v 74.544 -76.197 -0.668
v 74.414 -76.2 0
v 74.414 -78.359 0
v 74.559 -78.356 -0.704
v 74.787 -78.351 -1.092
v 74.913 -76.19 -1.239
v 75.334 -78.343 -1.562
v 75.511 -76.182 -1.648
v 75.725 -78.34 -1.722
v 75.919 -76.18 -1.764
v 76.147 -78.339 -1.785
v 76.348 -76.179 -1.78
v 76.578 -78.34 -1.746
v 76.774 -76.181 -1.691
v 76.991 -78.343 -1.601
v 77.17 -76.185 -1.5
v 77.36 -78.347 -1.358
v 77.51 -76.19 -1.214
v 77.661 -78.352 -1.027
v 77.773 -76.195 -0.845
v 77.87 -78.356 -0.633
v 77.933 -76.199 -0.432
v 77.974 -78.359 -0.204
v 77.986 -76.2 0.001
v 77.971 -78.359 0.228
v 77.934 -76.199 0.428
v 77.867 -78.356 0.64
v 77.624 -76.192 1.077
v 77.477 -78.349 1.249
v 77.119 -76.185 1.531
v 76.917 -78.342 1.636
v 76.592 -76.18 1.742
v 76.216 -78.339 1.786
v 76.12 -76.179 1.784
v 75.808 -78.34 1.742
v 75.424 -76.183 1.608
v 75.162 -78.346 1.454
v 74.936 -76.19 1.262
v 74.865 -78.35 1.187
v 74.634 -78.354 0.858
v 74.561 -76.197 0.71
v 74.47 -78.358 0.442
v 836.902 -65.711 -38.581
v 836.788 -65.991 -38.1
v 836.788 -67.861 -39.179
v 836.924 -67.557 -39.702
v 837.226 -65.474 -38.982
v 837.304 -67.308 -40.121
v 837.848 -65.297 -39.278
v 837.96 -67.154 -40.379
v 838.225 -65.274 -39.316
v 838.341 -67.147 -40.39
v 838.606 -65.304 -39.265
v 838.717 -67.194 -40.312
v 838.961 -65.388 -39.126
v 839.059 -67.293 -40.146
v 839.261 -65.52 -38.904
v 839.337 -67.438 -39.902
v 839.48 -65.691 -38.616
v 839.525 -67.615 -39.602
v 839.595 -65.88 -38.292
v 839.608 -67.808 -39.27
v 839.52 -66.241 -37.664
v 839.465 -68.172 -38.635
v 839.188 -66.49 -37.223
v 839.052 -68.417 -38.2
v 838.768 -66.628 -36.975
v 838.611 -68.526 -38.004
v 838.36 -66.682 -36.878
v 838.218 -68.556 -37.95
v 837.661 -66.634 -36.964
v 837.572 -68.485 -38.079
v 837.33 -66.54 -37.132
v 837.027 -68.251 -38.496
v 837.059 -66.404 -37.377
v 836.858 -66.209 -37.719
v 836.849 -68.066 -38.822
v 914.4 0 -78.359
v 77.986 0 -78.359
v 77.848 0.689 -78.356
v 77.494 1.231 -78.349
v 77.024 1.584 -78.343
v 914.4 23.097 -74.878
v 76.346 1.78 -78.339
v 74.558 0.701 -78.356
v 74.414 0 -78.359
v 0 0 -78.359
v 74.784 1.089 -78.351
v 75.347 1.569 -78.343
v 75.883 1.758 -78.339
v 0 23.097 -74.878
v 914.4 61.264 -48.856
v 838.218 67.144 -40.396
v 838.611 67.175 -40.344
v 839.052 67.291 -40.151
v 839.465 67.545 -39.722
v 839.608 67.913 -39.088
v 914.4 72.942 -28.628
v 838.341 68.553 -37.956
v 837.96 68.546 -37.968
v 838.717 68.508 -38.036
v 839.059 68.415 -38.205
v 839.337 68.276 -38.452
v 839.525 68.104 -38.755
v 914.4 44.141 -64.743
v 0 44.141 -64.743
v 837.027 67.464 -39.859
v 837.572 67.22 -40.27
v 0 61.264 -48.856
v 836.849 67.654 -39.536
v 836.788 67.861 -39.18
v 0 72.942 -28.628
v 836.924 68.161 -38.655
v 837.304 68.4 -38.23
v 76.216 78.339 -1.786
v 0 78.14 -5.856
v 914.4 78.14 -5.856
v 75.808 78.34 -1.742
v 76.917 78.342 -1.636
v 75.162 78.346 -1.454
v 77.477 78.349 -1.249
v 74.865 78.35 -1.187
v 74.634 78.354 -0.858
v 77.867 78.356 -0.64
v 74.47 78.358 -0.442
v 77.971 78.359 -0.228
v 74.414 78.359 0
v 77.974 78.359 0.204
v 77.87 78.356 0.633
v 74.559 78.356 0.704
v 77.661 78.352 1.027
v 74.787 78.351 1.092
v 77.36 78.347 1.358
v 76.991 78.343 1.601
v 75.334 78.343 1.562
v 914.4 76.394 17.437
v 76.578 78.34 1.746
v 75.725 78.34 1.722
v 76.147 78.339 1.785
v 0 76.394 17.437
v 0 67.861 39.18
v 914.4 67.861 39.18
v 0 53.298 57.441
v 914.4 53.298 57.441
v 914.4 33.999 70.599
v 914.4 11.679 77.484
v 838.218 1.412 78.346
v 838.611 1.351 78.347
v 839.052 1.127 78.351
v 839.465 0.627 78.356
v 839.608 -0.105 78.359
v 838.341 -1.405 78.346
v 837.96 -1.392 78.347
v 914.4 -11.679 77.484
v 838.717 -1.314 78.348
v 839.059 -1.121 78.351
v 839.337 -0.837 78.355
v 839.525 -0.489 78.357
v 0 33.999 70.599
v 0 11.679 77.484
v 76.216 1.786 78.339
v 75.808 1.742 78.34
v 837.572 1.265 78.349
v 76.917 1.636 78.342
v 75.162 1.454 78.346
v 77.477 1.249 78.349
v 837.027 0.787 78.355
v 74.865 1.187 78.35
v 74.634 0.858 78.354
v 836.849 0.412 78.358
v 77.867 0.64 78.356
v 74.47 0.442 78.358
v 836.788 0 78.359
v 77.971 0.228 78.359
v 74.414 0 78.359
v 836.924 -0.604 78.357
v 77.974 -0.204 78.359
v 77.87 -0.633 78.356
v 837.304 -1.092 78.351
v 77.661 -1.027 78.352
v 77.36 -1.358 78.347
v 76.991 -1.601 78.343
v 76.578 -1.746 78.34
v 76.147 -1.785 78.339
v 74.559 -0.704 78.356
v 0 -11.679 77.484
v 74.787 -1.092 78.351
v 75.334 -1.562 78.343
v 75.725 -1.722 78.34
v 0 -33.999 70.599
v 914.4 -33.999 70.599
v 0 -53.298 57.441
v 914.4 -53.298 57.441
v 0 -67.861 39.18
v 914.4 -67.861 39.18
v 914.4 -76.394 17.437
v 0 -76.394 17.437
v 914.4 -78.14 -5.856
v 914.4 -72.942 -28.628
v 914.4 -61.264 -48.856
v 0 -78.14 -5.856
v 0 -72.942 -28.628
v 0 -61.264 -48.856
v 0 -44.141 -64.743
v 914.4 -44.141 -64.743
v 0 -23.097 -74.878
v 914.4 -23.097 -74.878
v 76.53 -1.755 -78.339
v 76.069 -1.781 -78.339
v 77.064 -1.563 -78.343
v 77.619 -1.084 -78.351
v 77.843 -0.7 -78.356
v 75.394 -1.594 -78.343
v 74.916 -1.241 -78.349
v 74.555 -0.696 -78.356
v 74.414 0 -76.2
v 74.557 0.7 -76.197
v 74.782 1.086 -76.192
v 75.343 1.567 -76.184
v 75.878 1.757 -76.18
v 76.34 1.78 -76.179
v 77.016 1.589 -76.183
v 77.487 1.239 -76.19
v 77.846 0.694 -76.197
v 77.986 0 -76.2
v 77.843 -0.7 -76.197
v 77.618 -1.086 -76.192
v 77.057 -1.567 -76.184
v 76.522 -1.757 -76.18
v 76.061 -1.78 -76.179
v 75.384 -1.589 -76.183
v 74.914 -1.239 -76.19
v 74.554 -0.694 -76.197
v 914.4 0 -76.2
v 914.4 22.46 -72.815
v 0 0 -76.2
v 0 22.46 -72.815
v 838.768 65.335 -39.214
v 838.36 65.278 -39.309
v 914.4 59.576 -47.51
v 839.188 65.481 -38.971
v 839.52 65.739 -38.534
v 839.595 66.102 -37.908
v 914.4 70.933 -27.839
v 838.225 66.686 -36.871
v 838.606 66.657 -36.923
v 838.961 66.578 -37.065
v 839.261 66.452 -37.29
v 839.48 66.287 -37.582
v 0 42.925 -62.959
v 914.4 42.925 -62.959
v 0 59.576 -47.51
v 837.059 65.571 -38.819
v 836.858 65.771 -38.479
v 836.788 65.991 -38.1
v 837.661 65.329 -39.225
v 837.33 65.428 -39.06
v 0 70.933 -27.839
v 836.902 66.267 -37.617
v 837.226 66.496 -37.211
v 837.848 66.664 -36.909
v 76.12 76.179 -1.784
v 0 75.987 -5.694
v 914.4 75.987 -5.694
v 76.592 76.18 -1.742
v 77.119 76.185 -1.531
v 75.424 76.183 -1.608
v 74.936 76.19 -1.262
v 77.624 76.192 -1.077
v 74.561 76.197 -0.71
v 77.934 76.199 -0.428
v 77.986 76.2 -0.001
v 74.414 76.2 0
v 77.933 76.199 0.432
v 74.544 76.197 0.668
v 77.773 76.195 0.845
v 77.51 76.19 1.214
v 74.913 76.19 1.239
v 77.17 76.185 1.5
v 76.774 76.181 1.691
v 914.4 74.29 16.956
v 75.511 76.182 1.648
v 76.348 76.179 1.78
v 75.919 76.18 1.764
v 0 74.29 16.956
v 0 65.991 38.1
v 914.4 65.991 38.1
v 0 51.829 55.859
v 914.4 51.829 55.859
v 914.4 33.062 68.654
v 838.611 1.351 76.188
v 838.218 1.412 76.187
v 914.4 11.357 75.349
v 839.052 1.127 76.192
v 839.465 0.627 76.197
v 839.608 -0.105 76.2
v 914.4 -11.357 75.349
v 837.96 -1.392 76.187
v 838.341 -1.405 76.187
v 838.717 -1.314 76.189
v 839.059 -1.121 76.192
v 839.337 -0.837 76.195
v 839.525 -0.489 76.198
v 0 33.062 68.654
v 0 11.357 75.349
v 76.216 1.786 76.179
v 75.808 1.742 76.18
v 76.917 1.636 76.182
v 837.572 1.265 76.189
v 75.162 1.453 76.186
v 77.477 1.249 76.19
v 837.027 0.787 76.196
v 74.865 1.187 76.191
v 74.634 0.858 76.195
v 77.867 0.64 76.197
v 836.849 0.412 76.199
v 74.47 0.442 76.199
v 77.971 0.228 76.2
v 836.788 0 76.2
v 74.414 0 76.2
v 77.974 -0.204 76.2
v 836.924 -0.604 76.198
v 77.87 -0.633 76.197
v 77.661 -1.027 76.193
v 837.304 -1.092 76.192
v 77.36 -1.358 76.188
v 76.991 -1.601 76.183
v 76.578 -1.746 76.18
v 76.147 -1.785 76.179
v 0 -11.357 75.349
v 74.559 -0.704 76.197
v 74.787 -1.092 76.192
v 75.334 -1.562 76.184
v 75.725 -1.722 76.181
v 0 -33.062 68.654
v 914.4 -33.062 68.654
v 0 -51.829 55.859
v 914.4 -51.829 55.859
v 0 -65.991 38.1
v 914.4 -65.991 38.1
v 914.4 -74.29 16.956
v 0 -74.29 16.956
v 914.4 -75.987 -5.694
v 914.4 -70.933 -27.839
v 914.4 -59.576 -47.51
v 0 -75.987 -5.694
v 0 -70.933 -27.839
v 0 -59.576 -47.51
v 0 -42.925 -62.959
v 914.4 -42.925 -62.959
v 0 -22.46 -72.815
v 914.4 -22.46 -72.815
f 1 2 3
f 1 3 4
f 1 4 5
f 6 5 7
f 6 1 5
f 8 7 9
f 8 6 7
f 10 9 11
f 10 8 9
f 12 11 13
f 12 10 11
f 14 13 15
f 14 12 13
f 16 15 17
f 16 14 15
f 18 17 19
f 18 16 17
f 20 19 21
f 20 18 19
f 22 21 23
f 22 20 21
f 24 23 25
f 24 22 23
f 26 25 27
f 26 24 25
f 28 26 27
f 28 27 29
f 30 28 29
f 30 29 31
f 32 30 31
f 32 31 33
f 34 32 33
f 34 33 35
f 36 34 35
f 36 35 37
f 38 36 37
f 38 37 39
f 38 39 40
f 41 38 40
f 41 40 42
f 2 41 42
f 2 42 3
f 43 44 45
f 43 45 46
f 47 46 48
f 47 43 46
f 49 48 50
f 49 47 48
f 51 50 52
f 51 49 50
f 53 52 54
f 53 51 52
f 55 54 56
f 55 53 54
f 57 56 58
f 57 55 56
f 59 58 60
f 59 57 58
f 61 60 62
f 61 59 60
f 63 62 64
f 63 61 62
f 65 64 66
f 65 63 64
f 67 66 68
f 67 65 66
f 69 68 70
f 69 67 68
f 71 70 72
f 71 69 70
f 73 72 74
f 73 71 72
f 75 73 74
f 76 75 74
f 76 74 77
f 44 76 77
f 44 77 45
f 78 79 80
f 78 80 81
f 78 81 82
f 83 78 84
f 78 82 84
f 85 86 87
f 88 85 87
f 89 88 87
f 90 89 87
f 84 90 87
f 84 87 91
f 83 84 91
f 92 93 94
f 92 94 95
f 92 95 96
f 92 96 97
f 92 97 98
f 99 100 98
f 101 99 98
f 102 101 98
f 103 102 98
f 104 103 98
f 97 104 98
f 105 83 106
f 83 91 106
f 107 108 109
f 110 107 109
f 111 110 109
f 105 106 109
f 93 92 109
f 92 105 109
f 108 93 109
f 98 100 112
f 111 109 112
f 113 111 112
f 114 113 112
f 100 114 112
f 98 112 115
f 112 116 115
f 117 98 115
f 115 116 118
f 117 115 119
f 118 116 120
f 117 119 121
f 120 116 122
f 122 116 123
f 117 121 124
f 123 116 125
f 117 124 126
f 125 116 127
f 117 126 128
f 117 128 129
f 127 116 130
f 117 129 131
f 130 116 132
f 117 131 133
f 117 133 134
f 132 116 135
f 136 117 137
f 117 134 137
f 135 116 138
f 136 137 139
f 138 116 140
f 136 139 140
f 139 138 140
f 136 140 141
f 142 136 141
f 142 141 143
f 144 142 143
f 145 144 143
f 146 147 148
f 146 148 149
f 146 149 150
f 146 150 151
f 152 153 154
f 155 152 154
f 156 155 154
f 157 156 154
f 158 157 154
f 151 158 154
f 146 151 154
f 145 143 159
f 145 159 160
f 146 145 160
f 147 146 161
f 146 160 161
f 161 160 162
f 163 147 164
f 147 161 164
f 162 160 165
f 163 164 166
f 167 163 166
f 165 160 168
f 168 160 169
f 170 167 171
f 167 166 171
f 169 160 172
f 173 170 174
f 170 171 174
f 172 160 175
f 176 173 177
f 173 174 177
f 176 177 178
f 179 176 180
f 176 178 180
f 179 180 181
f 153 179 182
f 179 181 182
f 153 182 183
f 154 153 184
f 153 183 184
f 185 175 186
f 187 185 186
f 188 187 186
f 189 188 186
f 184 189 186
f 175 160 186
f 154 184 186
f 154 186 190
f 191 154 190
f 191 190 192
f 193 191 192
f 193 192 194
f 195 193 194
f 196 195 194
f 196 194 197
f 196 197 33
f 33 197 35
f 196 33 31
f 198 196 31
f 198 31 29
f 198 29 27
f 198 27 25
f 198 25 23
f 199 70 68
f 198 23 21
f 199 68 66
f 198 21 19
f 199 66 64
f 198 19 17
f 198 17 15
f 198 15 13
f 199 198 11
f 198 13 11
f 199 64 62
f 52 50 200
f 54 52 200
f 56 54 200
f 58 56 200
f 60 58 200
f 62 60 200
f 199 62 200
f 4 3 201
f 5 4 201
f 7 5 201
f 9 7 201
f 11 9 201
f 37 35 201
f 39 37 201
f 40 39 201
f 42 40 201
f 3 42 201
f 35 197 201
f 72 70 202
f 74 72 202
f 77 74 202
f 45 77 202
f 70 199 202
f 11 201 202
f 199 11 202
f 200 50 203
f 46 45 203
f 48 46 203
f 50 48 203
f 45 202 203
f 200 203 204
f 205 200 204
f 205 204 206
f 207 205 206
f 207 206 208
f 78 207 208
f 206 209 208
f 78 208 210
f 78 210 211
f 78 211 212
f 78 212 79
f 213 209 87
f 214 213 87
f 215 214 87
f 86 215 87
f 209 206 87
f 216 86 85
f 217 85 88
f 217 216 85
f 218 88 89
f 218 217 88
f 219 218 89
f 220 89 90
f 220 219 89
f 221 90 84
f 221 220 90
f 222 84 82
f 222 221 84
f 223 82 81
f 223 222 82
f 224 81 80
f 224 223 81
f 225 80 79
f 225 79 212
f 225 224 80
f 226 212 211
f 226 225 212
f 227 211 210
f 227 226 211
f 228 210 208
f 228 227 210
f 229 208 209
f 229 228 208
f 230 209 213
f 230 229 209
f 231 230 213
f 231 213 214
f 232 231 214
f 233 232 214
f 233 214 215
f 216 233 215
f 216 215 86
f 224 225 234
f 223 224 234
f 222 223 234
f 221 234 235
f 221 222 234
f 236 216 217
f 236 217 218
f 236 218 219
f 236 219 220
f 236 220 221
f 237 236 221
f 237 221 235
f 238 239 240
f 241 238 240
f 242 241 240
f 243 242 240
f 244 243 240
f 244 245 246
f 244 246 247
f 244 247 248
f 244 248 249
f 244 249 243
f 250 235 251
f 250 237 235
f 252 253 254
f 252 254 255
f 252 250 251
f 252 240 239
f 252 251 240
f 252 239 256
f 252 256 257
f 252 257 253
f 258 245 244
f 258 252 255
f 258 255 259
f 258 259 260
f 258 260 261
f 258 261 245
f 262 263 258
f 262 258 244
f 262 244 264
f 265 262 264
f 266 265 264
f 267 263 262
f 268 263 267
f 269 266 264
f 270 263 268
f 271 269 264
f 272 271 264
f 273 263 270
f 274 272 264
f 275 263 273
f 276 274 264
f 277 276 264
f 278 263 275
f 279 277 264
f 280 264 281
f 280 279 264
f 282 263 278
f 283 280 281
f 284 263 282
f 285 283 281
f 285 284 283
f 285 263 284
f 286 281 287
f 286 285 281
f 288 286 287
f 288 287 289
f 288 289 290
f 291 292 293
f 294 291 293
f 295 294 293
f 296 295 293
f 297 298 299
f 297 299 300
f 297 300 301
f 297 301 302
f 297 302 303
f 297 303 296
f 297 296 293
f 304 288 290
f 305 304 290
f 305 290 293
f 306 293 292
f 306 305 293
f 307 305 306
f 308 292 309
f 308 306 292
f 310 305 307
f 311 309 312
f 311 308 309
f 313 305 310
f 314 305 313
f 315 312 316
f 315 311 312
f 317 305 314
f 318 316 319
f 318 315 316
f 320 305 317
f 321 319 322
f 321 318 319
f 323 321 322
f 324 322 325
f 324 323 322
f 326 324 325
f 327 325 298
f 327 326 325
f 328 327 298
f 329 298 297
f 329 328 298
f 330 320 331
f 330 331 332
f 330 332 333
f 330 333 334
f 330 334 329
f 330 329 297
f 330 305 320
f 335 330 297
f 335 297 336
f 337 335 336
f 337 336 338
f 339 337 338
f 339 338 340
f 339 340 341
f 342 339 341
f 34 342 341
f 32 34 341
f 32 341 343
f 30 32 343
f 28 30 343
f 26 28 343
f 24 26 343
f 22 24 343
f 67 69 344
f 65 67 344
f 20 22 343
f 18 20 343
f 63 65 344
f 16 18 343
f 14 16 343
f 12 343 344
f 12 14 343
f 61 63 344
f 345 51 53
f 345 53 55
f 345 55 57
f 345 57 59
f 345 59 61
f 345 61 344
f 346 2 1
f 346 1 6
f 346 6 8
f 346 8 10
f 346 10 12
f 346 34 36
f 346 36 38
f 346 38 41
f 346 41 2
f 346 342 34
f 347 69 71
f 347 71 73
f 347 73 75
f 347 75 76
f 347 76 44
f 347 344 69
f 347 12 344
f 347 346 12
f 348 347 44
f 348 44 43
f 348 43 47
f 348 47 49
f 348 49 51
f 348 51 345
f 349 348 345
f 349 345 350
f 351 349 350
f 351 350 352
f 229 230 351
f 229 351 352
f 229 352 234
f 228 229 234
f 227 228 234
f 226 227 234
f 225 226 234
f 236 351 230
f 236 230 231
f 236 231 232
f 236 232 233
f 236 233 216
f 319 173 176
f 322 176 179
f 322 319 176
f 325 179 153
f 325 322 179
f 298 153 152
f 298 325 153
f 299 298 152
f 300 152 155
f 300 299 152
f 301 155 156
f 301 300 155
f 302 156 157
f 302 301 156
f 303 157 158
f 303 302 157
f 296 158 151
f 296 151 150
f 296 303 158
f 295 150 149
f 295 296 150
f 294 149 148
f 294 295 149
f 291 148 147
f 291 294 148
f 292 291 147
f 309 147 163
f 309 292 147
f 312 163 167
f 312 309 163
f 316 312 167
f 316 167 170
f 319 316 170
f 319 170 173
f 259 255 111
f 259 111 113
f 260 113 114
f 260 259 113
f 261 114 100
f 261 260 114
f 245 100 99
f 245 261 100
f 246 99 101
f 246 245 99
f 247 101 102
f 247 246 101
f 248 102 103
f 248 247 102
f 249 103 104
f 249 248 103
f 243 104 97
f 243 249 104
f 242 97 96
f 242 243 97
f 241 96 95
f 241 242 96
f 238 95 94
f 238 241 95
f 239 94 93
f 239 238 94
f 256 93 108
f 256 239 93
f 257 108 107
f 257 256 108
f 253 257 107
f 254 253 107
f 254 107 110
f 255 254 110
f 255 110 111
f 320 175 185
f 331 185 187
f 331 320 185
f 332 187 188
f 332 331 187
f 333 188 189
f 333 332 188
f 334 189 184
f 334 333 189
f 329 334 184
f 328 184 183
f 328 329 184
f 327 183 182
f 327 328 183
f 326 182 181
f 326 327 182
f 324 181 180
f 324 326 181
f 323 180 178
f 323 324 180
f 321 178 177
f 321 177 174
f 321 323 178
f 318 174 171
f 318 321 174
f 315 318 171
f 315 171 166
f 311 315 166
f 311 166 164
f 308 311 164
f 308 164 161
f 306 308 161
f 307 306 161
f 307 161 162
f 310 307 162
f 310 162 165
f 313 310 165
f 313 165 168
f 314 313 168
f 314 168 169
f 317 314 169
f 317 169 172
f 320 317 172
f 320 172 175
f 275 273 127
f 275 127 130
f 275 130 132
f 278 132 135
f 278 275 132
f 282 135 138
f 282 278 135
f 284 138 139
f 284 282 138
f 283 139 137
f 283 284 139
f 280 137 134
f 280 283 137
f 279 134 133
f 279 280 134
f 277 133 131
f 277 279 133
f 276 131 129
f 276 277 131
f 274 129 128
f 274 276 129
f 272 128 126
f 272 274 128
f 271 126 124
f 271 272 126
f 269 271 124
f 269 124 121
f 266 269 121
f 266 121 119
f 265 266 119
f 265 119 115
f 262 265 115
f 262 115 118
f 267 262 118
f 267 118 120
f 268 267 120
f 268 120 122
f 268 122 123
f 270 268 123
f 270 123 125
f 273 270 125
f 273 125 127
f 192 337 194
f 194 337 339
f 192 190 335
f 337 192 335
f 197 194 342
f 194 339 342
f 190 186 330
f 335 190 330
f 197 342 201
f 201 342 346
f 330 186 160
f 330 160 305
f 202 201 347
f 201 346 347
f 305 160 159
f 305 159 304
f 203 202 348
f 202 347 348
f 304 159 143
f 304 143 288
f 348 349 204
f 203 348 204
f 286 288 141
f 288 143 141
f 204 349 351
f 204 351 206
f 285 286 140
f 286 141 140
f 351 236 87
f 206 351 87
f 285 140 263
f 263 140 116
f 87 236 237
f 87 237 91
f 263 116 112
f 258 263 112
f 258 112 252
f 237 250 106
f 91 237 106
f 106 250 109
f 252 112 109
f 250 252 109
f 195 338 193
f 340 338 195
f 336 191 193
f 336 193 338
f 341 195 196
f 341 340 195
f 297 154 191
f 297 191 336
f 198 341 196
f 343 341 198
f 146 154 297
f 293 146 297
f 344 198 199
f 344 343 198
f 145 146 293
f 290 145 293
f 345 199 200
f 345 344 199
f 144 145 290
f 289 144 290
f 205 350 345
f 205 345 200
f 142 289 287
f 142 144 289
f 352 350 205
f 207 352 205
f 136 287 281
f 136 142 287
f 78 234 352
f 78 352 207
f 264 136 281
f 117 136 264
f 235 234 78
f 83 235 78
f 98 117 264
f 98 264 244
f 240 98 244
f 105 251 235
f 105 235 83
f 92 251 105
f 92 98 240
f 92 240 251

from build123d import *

# Parameters (mm, degrees)
SKETCH3_R               = 78.359
SKETCH3_R_2             = 76.2
BOSS_EXTRUDE1_DEPTH     = 914.4
CUT_EXTRUDE1_REACH      = 923.09
CUT_EXTRUDE1_END_RADIUS = 78.359
SKETCH4_R               = 1.41224
CIRPATTERN1_COUNT       = 3
CUT_EXTRUDE2_REACH      = 923.09
CUT_EXTRUDE2_END_RADIUS = 78.359
SKETCH5_R               = 1.7859375
CIRPATTERN2_COUNT       = 4


with BuildPart() as part:
    # Sketch3 → Boss-Extrude1 (new body)
    with BuildSketch(Plane(origin=(0, 0, 0), x_dir=(0, 0, -1), z_dir=(1, 0, 0))):
        Circle(SKETCH3_R)
        Circle(SKETCH3_R_2, mode=Mode.SUBTRACT)
    extrude(amount=BOSS_EXTRUDE1_DEPTH)

    # Cut-Extrude1: up to this cylinder (the profile starts inside it)
    cut_extrude1_end = Plane(origin=(838.2, 0, 0), z_dir=(-1, 0, 0)) * Cylinder(CUT_EXTRUDE1_END_RADIUS, 2003.898, mode=Mode.PRIVATE)
    # Sketch4 → Cut-Extrude1 (cut, up to the surface)
    with BuildSketch(Plane.XY, mode=Mode.PRIVATE) as cut_extrude1_sk1:
        with Locations(Location((838.2, 0, 0), (0, 0, 180))):
            Circle(SKETCH4_R)
    cut_extrude1_tool1 = extrude(cut_extrude1_sk1.sketch, amount=CUT_EXTRUDE1_REACH, mode=Mode.PRIVATE) & cut_extrude1_end
    cut_extrude1 = cut_extrude1_tool1.solids().sort_by_distance((838.2, 0, 0))[0]
    add(cut_extrude1, mode=Mode.SUBTRACT)

    # CirPattern1: Cut-Extrude1 ×3 about axis
    cirpattern1_axis = Axis((914.4, 0, 0), (1, 0, 0))
    for i in range(1, CIRPATTERN1_COUNT):
        add(cut_extrude1.rotate(cirpattern1_axis, i * 360 / CIRPATTERN1_COUNT), mode=Mode.SUBTRACT)

    # Cut-Extrude2: up to this cylinder (the profile starts inside it)
    cut_extrude2_end = Plane(origin=(76.2, 0, 0), z_dir=(-1, 0, 0)) * Cylinder(CUT_EXTRUDE2_END_RADIUS, 2003.898, mode=Mode.PRIVATE)
    # Sketch5 → Cut-Extrude2 (cut, up to the surface)
    with BuildSketch(Plane.XY, mode=Mode.PRIVATE) as cut_extrude2_sk1:
        with Locations(Location((76.2, 0, 0), (0, 0, 180))):
            Circle(SKETCH5_R)
    cut_extrude2_tool1 = extrude(cut_extrude2_sk1.sketch, amount=CUT_EXTRUDE2_REACH, mode=Mode.PRIVATE) & cut_extrude2_end
    cut_extrude2 = cut_extrude2_tool1.solids().sort_by_distance((76.2, 0, 0))[0]
    add(cut_extrude2, mode=Mode.SUBTRACT)

    # CirPattern2: Cut-Extrude2 ×4 about axis
    cirpattern2_axis = Axis((0, 0, 0), (1, 0, 0))
    for i in range(1, CIRPATTERN2_COUNT):
        add(cut_extrude2.rotate(cirpattern2_axis, i * 360 / CIRPATTERN2_COUNT), mode=Mode.SUBTRACT)


solid = part.part
